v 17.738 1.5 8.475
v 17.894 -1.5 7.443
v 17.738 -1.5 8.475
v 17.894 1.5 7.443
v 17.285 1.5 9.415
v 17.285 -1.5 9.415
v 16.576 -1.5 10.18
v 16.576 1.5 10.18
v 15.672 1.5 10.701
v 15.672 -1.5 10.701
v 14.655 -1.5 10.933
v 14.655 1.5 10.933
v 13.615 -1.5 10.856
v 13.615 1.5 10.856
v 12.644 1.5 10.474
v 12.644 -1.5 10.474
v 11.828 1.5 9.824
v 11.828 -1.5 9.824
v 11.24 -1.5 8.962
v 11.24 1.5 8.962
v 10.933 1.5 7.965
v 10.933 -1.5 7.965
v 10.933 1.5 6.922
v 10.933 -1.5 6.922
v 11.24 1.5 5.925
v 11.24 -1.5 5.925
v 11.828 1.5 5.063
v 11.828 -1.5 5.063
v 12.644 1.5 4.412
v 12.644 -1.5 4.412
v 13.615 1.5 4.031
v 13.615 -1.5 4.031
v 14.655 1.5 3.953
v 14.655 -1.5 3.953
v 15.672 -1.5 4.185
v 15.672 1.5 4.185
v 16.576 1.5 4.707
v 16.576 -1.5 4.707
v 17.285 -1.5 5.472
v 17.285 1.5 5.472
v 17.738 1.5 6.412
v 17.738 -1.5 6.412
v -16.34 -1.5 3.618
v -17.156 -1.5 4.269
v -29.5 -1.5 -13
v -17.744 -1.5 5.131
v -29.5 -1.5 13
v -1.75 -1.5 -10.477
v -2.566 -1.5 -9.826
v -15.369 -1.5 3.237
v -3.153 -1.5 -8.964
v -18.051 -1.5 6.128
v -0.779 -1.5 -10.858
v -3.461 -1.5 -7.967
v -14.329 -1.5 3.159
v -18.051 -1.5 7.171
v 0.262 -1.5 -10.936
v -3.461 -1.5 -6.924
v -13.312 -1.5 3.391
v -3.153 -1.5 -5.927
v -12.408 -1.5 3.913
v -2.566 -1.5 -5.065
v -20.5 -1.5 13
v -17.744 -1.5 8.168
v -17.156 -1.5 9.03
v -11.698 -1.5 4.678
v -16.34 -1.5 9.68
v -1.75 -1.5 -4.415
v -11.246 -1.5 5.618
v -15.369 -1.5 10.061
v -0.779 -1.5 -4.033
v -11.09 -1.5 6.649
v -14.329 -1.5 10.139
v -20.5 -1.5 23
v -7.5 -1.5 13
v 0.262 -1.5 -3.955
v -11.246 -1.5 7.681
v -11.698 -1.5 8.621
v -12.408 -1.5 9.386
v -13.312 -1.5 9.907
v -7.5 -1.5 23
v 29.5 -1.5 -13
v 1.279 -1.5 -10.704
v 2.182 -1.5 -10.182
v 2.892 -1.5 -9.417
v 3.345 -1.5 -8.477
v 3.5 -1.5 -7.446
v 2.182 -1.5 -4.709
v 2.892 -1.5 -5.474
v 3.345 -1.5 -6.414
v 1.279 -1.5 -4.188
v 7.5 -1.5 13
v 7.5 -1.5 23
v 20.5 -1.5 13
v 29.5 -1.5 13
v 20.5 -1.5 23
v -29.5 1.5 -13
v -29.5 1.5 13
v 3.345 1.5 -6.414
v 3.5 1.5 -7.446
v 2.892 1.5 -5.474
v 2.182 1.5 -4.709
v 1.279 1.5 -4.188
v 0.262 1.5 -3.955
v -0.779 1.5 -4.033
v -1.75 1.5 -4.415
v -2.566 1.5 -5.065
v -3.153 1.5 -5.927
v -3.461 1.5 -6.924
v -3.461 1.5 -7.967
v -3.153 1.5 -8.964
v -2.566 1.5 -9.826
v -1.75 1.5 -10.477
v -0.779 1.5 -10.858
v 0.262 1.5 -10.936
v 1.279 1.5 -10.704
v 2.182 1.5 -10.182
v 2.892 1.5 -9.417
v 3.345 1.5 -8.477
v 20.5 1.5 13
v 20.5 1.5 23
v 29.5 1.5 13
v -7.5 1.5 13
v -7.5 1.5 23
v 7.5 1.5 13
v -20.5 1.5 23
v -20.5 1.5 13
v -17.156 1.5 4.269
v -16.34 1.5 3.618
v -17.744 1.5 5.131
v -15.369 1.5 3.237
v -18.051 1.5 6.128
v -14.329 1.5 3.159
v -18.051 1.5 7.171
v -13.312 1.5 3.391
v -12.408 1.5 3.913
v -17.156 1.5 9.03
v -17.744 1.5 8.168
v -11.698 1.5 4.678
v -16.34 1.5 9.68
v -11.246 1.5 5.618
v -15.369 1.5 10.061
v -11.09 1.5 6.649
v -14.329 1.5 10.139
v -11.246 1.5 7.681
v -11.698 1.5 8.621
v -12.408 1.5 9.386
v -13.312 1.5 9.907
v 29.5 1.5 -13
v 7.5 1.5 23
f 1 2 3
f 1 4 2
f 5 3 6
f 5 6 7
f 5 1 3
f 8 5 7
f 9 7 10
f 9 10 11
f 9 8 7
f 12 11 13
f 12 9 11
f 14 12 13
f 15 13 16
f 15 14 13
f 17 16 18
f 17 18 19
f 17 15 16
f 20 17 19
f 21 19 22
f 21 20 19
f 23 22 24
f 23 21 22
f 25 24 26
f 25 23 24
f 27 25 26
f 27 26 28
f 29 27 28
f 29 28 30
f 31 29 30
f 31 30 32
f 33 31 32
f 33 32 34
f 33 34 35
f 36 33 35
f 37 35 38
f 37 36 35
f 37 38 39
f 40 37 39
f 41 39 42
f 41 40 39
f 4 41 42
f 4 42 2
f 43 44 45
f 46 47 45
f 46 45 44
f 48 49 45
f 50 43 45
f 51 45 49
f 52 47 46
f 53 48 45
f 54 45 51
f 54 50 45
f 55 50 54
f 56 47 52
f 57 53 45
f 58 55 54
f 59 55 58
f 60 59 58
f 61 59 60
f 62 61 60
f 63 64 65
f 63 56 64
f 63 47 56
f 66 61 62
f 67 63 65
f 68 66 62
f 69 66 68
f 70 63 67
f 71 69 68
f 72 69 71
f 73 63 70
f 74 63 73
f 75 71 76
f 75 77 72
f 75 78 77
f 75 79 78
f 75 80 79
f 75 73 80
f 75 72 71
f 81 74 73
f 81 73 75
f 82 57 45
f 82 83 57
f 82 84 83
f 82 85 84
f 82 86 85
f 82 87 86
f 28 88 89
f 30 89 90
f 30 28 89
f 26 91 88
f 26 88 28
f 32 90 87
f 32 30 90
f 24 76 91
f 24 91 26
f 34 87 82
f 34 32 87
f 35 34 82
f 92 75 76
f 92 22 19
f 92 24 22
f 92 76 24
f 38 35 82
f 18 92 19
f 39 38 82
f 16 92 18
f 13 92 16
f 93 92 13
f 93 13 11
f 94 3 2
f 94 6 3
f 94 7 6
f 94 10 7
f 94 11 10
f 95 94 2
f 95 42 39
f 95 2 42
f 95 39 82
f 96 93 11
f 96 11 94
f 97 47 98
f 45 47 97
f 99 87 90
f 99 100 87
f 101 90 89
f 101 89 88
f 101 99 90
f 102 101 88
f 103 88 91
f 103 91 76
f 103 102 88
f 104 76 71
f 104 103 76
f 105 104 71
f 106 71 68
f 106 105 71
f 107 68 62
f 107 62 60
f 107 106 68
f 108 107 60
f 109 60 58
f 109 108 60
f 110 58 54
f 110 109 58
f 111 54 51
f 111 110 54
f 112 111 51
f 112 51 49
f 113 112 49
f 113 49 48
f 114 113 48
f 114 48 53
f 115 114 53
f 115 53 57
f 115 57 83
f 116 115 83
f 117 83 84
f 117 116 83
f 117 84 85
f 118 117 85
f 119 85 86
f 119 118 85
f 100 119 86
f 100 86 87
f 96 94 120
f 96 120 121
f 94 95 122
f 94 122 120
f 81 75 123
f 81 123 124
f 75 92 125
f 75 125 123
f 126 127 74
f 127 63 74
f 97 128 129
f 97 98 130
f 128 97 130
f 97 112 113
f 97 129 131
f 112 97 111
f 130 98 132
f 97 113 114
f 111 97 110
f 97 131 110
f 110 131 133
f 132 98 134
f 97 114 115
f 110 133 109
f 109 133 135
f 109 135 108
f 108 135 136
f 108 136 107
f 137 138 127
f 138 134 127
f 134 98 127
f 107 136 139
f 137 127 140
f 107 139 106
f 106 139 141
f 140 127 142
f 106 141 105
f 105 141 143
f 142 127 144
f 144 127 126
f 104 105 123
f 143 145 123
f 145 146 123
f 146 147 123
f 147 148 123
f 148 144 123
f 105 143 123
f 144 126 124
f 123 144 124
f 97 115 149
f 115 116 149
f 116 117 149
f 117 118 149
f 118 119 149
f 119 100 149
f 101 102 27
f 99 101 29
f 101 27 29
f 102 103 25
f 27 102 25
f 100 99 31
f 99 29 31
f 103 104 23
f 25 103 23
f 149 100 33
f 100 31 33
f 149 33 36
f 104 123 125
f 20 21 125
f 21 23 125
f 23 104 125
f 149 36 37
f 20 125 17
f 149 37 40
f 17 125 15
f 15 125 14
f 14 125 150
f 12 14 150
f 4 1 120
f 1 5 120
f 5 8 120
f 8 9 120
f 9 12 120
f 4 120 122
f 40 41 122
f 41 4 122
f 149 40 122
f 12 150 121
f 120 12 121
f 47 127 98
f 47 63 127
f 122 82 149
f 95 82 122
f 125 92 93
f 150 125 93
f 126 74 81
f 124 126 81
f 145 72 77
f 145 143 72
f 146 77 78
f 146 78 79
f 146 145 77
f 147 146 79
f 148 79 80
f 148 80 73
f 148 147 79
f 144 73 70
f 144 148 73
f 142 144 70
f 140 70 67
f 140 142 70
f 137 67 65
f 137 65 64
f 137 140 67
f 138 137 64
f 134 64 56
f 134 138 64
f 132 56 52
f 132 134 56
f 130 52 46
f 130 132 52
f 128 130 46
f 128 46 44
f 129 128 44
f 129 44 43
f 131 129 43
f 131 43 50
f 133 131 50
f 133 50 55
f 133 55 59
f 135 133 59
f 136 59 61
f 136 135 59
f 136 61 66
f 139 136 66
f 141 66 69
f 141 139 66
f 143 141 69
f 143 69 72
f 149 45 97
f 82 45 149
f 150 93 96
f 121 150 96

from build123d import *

# Parameters (mm, degrees)
F0_R     = 3.5
F0_W     = 13
F0_H     = 10
F1_DEPTH = 1.5


with BuildPart() as f1:
    # F0 (on Front) → F1 (new body, symmetric)
    with BuildSketch(Plane.XZ):
        Polygon((-29.5, -13), (29.5, -13), (29.5, 13), (20.5, 13), (7.5, 13), (-7.5, 13), (-20.5, 13), (-29.5, 13), align=None)
        with Locations((0, -7.445684)):
            Circle(F0_R, mode=Mode.SUBTRACT)
        with Locations((-14.590251, 6.649186)):
            Circle(F0_R, mode=Mode.SUBTRACT)
        with Locations((14.393566, 7.443263)):
            Circle(F0_R, mode=Mode.SUBTRACT)
        with Locations((14, 18)):
            Rectangle(F0_W, F0_H)
        with Locations((-14, 18)):
            Rectangle(F0_W, F0_H)
    extrude(amount=F1_DEPTH, both=True)


solid = f1.part
